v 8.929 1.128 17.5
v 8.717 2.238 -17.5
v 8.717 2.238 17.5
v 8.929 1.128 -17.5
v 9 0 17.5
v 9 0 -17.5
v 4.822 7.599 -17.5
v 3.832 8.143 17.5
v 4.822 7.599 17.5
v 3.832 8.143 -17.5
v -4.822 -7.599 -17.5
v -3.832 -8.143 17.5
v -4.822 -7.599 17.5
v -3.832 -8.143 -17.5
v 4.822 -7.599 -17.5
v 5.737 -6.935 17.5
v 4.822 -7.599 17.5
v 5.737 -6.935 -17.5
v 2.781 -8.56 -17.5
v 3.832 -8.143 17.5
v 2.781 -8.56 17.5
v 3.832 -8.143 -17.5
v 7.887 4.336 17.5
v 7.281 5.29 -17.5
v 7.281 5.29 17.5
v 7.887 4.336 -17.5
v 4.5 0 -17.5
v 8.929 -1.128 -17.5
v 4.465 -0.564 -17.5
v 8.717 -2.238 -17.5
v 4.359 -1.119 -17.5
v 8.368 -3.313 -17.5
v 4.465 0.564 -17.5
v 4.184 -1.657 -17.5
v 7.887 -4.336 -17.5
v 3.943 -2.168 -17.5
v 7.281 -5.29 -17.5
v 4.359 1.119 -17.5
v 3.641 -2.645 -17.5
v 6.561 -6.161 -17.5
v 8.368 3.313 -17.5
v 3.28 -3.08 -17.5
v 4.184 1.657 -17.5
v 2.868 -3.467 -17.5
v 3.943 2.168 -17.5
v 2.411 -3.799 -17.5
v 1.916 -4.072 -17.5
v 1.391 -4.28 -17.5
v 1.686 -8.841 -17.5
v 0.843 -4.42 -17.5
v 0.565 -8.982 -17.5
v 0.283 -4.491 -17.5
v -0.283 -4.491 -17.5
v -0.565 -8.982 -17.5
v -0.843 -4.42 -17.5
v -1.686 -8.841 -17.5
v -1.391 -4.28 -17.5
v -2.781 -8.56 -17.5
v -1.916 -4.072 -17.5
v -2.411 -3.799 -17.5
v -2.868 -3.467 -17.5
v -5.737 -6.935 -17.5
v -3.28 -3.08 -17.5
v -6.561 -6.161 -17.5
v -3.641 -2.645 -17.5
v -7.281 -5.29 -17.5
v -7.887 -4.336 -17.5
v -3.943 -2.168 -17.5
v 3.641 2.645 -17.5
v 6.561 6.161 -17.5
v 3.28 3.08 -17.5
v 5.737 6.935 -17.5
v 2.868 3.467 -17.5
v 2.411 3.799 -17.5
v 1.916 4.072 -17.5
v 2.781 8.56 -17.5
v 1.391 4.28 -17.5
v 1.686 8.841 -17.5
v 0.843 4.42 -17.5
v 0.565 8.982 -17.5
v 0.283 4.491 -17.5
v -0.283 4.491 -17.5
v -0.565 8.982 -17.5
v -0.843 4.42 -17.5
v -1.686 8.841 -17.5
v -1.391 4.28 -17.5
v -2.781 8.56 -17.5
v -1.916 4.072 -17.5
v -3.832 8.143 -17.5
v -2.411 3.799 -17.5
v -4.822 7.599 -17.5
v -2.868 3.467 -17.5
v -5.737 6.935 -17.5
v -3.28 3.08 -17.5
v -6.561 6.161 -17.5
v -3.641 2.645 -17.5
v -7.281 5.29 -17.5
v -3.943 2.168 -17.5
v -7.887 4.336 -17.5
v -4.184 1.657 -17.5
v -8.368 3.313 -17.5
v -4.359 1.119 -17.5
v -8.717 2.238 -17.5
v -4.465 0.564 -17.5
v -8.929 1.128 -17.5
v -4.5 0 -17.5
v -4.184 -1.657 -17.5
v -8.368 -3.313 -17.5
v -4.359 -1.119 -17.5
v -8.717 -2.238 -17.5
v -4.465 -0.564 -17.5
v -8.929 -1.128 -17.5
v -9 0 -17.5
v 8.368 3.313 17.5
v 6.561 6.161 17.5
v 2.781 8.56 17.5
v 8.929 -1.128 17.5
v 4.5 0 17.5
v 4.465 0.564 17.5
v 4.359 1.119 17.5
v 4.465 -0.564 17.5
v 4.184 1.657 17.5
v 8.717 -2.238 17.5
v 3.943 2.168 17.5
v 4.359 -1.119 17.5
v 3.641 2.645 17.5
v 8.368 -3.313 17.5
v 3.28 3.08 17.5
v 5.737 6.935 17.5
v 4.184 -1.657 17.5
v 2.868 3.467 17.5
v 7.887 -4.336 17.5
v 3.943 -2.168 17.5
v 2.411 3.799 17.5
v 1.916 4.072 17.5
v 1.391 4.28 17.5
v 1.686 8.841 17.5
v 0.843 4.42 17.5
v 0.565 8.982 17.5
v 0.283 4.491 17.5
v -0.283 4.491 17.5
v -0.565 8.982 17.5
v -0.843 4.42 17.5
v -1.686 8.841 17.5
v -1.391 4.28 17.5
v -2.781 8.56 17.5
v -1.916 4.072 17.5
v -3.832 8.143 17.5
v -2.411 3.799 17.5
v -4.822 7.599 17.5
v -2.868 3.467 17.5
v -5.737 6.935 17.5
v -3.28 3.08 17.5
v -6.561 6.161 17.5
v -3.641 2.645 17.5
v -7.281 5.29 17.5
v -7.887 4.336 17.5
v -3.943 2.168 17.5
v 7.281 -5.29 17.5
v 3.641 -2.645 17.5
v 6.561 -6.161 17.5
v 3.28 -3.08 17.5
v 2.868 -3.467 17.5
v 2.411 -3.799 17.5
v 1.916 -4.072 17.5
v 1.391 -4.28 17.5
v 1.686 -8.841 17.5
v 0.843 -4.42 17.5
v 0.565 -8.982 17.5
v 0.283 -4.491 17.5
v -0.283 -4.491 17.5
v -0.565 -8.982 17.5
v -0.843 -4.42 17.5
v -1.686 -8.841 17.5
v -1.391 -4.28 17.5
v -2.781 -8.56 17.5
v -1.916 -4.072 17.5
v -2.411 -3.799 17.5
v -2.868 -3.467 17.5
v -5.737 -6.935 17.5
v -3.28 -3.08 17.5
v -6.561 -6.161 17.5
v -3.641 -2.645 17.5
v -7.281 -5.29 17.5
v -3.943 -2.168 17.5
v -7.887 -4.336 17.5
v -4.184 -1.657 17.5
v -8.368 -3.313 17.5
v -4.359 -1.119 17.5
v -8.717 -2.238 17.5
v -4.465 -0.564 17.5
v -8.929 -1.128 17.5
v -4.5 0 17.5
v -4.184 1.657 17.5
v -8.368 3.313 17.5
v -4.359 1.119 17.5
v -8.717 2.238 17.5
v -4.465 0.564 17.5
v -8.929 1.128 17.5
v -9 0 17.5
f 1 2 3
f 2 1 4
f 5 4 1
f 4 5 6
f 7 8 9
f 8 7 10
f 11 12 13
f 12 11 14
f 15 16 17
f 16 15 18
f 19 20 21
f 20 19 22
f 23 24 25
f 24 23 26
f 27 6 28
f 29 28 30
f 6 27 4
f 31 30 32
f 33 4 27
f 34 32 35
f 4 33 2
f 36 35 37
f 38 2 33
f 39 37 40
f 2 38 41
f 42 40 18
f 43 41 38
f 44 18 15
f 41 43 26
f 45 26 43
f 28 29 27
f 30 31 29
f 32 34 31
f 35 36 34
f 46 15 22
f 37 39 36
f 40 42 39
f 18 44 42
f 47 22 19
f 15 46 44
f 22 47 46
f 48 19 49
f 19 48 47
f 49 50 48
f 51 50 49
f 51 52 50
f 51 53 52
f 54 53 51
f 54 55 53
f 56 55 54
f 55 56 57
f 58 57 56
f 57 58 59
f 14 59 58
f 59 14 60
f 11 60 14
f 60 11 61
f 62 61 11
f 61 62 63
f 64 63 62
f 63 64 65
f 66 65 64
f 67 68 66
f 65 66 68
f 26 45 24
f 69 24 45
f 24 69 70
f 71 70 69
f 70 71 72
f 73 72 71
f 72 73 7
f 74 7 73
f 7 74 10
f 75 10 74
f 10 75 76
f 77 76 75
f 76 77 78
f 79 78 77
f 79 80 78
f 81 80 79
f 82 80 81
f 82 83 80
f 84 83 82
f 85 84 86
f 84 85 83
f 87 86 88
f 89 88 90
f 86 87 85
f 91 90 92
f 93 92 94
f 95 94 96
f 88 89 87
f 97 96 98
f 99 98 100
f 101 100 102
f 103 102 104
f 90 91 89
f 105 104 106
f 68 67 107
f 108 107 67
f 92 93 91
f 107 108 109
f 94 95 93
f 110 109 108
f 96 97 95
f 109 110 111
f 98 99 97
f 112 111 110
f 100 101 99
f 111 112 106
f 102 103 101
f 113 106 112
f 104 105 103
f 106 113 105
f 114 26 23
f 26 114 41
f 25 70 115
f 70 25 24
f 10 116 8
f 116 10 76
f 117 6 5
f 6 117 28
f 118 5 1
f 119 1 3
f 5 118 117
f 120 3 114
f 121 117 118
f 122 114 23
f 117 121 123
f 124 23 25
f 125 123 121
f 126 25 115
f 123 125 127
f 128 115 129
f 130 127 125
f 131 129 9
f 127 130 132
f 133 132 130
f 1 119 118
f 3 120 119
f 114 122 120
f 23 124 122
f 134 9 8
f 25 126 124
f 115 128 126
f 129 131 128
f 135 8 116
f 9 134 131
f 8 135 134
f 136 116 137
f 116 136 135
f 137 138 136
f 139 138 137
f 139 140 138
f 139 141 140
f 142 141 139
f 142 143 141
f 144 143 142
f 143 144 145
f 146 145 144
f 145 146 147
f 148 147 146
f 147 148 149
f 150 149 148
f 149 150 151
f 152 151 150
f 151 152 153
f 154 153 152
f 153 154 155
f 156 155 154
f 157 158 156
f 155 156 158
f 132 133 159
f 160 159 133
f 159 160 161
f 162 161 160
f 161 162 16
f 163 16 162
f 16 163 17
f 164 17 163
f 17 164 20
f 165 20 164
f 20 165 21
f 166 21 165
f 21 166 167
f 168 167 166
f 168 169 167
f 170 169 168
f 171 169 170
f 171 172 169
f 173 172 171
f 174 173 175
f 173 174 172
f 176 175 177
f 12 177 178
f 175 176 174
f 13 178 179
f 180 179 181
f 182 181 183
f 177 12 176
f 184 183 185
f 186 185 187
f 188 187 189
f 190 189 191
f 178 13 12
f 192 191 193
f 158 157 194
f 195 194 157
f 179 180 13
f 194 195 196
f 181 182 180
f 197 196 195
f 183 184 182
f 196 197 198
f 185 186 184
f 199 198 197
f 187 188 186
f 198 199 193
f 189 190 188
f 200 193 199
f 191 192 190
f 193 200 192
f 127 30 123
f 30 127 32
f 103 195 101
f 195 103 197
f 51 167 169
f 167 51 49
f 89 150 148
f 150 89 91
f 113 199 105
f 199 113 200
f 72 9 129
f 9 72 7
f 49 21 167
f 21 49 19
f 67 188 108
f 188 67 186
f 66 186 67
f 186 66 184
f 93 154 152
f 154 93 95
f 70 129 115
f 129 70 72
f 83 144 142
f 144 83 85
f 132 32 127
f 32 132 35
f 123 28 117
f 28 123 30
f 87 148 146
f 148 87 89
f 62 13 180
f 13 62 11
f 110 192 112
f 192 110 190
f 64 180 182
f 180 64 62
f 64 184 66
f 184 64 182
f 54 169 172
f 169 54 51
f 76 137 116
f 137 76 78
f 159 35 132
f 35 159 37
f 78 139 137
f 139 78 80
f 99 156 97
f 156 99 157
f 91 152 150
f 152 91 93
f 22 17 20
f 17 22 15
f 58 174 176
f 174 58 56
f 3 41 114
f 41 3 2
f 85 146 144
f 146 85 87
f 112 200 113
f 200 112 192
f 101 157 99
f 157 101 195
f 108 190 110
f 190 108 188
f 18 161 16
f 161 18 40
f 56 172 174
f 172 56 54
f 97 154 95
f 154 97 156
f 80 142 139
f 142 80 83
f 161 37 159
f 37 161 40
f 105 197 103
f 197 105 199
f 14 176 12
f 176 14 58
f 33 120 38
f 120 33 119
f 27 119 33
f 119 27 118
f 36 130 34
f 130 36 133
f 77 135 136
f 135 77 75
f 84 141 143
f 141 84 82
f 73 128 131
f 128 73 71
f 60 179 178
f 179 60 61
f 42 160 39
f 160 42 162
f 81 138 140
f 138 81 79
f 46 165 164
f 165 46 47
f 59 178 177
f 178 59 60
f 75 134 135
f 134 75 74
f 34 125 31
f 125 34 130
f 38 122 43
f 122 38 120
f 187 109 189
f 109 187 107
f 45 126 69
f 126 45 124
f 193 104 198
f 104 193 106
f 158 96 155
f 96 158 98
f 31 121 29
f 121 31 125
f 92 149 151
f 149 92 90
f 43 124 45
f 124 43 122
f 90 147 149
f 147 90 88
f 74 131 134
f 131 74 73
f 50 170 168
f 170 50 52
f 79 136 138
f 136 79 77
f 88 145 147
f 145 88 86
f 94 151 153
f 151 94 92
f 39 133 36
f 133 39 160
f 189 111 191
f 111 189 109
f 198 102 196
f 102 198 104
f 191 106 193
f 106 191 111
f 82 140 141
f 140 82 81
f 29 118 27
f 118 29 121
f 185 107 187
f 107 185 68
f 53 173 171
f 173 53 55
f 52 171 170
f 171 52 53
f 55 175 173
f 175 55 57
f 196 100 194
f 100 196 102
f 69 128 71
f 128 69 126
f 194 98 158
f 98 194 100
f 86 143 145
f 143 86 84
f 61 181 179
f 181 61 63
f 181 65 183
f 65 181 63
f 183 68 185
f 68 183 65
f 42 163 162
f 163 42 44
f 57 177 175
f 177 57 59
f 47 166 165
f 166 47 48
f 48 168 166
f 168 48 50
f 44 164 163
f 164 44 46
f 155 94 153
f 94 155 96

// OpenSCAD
$fn = 50;


difference() {
	union() {
		translate(v = [0, 0, -17.5000000000]) {
			cylinder(h = 35, r = 9.0000000000);
		}
	}
	union() {
		translate(v = [0, 0, -100.0000000000]) {
			cylinder(h = 200, r = 4.5000000000);
		}
	}
}
